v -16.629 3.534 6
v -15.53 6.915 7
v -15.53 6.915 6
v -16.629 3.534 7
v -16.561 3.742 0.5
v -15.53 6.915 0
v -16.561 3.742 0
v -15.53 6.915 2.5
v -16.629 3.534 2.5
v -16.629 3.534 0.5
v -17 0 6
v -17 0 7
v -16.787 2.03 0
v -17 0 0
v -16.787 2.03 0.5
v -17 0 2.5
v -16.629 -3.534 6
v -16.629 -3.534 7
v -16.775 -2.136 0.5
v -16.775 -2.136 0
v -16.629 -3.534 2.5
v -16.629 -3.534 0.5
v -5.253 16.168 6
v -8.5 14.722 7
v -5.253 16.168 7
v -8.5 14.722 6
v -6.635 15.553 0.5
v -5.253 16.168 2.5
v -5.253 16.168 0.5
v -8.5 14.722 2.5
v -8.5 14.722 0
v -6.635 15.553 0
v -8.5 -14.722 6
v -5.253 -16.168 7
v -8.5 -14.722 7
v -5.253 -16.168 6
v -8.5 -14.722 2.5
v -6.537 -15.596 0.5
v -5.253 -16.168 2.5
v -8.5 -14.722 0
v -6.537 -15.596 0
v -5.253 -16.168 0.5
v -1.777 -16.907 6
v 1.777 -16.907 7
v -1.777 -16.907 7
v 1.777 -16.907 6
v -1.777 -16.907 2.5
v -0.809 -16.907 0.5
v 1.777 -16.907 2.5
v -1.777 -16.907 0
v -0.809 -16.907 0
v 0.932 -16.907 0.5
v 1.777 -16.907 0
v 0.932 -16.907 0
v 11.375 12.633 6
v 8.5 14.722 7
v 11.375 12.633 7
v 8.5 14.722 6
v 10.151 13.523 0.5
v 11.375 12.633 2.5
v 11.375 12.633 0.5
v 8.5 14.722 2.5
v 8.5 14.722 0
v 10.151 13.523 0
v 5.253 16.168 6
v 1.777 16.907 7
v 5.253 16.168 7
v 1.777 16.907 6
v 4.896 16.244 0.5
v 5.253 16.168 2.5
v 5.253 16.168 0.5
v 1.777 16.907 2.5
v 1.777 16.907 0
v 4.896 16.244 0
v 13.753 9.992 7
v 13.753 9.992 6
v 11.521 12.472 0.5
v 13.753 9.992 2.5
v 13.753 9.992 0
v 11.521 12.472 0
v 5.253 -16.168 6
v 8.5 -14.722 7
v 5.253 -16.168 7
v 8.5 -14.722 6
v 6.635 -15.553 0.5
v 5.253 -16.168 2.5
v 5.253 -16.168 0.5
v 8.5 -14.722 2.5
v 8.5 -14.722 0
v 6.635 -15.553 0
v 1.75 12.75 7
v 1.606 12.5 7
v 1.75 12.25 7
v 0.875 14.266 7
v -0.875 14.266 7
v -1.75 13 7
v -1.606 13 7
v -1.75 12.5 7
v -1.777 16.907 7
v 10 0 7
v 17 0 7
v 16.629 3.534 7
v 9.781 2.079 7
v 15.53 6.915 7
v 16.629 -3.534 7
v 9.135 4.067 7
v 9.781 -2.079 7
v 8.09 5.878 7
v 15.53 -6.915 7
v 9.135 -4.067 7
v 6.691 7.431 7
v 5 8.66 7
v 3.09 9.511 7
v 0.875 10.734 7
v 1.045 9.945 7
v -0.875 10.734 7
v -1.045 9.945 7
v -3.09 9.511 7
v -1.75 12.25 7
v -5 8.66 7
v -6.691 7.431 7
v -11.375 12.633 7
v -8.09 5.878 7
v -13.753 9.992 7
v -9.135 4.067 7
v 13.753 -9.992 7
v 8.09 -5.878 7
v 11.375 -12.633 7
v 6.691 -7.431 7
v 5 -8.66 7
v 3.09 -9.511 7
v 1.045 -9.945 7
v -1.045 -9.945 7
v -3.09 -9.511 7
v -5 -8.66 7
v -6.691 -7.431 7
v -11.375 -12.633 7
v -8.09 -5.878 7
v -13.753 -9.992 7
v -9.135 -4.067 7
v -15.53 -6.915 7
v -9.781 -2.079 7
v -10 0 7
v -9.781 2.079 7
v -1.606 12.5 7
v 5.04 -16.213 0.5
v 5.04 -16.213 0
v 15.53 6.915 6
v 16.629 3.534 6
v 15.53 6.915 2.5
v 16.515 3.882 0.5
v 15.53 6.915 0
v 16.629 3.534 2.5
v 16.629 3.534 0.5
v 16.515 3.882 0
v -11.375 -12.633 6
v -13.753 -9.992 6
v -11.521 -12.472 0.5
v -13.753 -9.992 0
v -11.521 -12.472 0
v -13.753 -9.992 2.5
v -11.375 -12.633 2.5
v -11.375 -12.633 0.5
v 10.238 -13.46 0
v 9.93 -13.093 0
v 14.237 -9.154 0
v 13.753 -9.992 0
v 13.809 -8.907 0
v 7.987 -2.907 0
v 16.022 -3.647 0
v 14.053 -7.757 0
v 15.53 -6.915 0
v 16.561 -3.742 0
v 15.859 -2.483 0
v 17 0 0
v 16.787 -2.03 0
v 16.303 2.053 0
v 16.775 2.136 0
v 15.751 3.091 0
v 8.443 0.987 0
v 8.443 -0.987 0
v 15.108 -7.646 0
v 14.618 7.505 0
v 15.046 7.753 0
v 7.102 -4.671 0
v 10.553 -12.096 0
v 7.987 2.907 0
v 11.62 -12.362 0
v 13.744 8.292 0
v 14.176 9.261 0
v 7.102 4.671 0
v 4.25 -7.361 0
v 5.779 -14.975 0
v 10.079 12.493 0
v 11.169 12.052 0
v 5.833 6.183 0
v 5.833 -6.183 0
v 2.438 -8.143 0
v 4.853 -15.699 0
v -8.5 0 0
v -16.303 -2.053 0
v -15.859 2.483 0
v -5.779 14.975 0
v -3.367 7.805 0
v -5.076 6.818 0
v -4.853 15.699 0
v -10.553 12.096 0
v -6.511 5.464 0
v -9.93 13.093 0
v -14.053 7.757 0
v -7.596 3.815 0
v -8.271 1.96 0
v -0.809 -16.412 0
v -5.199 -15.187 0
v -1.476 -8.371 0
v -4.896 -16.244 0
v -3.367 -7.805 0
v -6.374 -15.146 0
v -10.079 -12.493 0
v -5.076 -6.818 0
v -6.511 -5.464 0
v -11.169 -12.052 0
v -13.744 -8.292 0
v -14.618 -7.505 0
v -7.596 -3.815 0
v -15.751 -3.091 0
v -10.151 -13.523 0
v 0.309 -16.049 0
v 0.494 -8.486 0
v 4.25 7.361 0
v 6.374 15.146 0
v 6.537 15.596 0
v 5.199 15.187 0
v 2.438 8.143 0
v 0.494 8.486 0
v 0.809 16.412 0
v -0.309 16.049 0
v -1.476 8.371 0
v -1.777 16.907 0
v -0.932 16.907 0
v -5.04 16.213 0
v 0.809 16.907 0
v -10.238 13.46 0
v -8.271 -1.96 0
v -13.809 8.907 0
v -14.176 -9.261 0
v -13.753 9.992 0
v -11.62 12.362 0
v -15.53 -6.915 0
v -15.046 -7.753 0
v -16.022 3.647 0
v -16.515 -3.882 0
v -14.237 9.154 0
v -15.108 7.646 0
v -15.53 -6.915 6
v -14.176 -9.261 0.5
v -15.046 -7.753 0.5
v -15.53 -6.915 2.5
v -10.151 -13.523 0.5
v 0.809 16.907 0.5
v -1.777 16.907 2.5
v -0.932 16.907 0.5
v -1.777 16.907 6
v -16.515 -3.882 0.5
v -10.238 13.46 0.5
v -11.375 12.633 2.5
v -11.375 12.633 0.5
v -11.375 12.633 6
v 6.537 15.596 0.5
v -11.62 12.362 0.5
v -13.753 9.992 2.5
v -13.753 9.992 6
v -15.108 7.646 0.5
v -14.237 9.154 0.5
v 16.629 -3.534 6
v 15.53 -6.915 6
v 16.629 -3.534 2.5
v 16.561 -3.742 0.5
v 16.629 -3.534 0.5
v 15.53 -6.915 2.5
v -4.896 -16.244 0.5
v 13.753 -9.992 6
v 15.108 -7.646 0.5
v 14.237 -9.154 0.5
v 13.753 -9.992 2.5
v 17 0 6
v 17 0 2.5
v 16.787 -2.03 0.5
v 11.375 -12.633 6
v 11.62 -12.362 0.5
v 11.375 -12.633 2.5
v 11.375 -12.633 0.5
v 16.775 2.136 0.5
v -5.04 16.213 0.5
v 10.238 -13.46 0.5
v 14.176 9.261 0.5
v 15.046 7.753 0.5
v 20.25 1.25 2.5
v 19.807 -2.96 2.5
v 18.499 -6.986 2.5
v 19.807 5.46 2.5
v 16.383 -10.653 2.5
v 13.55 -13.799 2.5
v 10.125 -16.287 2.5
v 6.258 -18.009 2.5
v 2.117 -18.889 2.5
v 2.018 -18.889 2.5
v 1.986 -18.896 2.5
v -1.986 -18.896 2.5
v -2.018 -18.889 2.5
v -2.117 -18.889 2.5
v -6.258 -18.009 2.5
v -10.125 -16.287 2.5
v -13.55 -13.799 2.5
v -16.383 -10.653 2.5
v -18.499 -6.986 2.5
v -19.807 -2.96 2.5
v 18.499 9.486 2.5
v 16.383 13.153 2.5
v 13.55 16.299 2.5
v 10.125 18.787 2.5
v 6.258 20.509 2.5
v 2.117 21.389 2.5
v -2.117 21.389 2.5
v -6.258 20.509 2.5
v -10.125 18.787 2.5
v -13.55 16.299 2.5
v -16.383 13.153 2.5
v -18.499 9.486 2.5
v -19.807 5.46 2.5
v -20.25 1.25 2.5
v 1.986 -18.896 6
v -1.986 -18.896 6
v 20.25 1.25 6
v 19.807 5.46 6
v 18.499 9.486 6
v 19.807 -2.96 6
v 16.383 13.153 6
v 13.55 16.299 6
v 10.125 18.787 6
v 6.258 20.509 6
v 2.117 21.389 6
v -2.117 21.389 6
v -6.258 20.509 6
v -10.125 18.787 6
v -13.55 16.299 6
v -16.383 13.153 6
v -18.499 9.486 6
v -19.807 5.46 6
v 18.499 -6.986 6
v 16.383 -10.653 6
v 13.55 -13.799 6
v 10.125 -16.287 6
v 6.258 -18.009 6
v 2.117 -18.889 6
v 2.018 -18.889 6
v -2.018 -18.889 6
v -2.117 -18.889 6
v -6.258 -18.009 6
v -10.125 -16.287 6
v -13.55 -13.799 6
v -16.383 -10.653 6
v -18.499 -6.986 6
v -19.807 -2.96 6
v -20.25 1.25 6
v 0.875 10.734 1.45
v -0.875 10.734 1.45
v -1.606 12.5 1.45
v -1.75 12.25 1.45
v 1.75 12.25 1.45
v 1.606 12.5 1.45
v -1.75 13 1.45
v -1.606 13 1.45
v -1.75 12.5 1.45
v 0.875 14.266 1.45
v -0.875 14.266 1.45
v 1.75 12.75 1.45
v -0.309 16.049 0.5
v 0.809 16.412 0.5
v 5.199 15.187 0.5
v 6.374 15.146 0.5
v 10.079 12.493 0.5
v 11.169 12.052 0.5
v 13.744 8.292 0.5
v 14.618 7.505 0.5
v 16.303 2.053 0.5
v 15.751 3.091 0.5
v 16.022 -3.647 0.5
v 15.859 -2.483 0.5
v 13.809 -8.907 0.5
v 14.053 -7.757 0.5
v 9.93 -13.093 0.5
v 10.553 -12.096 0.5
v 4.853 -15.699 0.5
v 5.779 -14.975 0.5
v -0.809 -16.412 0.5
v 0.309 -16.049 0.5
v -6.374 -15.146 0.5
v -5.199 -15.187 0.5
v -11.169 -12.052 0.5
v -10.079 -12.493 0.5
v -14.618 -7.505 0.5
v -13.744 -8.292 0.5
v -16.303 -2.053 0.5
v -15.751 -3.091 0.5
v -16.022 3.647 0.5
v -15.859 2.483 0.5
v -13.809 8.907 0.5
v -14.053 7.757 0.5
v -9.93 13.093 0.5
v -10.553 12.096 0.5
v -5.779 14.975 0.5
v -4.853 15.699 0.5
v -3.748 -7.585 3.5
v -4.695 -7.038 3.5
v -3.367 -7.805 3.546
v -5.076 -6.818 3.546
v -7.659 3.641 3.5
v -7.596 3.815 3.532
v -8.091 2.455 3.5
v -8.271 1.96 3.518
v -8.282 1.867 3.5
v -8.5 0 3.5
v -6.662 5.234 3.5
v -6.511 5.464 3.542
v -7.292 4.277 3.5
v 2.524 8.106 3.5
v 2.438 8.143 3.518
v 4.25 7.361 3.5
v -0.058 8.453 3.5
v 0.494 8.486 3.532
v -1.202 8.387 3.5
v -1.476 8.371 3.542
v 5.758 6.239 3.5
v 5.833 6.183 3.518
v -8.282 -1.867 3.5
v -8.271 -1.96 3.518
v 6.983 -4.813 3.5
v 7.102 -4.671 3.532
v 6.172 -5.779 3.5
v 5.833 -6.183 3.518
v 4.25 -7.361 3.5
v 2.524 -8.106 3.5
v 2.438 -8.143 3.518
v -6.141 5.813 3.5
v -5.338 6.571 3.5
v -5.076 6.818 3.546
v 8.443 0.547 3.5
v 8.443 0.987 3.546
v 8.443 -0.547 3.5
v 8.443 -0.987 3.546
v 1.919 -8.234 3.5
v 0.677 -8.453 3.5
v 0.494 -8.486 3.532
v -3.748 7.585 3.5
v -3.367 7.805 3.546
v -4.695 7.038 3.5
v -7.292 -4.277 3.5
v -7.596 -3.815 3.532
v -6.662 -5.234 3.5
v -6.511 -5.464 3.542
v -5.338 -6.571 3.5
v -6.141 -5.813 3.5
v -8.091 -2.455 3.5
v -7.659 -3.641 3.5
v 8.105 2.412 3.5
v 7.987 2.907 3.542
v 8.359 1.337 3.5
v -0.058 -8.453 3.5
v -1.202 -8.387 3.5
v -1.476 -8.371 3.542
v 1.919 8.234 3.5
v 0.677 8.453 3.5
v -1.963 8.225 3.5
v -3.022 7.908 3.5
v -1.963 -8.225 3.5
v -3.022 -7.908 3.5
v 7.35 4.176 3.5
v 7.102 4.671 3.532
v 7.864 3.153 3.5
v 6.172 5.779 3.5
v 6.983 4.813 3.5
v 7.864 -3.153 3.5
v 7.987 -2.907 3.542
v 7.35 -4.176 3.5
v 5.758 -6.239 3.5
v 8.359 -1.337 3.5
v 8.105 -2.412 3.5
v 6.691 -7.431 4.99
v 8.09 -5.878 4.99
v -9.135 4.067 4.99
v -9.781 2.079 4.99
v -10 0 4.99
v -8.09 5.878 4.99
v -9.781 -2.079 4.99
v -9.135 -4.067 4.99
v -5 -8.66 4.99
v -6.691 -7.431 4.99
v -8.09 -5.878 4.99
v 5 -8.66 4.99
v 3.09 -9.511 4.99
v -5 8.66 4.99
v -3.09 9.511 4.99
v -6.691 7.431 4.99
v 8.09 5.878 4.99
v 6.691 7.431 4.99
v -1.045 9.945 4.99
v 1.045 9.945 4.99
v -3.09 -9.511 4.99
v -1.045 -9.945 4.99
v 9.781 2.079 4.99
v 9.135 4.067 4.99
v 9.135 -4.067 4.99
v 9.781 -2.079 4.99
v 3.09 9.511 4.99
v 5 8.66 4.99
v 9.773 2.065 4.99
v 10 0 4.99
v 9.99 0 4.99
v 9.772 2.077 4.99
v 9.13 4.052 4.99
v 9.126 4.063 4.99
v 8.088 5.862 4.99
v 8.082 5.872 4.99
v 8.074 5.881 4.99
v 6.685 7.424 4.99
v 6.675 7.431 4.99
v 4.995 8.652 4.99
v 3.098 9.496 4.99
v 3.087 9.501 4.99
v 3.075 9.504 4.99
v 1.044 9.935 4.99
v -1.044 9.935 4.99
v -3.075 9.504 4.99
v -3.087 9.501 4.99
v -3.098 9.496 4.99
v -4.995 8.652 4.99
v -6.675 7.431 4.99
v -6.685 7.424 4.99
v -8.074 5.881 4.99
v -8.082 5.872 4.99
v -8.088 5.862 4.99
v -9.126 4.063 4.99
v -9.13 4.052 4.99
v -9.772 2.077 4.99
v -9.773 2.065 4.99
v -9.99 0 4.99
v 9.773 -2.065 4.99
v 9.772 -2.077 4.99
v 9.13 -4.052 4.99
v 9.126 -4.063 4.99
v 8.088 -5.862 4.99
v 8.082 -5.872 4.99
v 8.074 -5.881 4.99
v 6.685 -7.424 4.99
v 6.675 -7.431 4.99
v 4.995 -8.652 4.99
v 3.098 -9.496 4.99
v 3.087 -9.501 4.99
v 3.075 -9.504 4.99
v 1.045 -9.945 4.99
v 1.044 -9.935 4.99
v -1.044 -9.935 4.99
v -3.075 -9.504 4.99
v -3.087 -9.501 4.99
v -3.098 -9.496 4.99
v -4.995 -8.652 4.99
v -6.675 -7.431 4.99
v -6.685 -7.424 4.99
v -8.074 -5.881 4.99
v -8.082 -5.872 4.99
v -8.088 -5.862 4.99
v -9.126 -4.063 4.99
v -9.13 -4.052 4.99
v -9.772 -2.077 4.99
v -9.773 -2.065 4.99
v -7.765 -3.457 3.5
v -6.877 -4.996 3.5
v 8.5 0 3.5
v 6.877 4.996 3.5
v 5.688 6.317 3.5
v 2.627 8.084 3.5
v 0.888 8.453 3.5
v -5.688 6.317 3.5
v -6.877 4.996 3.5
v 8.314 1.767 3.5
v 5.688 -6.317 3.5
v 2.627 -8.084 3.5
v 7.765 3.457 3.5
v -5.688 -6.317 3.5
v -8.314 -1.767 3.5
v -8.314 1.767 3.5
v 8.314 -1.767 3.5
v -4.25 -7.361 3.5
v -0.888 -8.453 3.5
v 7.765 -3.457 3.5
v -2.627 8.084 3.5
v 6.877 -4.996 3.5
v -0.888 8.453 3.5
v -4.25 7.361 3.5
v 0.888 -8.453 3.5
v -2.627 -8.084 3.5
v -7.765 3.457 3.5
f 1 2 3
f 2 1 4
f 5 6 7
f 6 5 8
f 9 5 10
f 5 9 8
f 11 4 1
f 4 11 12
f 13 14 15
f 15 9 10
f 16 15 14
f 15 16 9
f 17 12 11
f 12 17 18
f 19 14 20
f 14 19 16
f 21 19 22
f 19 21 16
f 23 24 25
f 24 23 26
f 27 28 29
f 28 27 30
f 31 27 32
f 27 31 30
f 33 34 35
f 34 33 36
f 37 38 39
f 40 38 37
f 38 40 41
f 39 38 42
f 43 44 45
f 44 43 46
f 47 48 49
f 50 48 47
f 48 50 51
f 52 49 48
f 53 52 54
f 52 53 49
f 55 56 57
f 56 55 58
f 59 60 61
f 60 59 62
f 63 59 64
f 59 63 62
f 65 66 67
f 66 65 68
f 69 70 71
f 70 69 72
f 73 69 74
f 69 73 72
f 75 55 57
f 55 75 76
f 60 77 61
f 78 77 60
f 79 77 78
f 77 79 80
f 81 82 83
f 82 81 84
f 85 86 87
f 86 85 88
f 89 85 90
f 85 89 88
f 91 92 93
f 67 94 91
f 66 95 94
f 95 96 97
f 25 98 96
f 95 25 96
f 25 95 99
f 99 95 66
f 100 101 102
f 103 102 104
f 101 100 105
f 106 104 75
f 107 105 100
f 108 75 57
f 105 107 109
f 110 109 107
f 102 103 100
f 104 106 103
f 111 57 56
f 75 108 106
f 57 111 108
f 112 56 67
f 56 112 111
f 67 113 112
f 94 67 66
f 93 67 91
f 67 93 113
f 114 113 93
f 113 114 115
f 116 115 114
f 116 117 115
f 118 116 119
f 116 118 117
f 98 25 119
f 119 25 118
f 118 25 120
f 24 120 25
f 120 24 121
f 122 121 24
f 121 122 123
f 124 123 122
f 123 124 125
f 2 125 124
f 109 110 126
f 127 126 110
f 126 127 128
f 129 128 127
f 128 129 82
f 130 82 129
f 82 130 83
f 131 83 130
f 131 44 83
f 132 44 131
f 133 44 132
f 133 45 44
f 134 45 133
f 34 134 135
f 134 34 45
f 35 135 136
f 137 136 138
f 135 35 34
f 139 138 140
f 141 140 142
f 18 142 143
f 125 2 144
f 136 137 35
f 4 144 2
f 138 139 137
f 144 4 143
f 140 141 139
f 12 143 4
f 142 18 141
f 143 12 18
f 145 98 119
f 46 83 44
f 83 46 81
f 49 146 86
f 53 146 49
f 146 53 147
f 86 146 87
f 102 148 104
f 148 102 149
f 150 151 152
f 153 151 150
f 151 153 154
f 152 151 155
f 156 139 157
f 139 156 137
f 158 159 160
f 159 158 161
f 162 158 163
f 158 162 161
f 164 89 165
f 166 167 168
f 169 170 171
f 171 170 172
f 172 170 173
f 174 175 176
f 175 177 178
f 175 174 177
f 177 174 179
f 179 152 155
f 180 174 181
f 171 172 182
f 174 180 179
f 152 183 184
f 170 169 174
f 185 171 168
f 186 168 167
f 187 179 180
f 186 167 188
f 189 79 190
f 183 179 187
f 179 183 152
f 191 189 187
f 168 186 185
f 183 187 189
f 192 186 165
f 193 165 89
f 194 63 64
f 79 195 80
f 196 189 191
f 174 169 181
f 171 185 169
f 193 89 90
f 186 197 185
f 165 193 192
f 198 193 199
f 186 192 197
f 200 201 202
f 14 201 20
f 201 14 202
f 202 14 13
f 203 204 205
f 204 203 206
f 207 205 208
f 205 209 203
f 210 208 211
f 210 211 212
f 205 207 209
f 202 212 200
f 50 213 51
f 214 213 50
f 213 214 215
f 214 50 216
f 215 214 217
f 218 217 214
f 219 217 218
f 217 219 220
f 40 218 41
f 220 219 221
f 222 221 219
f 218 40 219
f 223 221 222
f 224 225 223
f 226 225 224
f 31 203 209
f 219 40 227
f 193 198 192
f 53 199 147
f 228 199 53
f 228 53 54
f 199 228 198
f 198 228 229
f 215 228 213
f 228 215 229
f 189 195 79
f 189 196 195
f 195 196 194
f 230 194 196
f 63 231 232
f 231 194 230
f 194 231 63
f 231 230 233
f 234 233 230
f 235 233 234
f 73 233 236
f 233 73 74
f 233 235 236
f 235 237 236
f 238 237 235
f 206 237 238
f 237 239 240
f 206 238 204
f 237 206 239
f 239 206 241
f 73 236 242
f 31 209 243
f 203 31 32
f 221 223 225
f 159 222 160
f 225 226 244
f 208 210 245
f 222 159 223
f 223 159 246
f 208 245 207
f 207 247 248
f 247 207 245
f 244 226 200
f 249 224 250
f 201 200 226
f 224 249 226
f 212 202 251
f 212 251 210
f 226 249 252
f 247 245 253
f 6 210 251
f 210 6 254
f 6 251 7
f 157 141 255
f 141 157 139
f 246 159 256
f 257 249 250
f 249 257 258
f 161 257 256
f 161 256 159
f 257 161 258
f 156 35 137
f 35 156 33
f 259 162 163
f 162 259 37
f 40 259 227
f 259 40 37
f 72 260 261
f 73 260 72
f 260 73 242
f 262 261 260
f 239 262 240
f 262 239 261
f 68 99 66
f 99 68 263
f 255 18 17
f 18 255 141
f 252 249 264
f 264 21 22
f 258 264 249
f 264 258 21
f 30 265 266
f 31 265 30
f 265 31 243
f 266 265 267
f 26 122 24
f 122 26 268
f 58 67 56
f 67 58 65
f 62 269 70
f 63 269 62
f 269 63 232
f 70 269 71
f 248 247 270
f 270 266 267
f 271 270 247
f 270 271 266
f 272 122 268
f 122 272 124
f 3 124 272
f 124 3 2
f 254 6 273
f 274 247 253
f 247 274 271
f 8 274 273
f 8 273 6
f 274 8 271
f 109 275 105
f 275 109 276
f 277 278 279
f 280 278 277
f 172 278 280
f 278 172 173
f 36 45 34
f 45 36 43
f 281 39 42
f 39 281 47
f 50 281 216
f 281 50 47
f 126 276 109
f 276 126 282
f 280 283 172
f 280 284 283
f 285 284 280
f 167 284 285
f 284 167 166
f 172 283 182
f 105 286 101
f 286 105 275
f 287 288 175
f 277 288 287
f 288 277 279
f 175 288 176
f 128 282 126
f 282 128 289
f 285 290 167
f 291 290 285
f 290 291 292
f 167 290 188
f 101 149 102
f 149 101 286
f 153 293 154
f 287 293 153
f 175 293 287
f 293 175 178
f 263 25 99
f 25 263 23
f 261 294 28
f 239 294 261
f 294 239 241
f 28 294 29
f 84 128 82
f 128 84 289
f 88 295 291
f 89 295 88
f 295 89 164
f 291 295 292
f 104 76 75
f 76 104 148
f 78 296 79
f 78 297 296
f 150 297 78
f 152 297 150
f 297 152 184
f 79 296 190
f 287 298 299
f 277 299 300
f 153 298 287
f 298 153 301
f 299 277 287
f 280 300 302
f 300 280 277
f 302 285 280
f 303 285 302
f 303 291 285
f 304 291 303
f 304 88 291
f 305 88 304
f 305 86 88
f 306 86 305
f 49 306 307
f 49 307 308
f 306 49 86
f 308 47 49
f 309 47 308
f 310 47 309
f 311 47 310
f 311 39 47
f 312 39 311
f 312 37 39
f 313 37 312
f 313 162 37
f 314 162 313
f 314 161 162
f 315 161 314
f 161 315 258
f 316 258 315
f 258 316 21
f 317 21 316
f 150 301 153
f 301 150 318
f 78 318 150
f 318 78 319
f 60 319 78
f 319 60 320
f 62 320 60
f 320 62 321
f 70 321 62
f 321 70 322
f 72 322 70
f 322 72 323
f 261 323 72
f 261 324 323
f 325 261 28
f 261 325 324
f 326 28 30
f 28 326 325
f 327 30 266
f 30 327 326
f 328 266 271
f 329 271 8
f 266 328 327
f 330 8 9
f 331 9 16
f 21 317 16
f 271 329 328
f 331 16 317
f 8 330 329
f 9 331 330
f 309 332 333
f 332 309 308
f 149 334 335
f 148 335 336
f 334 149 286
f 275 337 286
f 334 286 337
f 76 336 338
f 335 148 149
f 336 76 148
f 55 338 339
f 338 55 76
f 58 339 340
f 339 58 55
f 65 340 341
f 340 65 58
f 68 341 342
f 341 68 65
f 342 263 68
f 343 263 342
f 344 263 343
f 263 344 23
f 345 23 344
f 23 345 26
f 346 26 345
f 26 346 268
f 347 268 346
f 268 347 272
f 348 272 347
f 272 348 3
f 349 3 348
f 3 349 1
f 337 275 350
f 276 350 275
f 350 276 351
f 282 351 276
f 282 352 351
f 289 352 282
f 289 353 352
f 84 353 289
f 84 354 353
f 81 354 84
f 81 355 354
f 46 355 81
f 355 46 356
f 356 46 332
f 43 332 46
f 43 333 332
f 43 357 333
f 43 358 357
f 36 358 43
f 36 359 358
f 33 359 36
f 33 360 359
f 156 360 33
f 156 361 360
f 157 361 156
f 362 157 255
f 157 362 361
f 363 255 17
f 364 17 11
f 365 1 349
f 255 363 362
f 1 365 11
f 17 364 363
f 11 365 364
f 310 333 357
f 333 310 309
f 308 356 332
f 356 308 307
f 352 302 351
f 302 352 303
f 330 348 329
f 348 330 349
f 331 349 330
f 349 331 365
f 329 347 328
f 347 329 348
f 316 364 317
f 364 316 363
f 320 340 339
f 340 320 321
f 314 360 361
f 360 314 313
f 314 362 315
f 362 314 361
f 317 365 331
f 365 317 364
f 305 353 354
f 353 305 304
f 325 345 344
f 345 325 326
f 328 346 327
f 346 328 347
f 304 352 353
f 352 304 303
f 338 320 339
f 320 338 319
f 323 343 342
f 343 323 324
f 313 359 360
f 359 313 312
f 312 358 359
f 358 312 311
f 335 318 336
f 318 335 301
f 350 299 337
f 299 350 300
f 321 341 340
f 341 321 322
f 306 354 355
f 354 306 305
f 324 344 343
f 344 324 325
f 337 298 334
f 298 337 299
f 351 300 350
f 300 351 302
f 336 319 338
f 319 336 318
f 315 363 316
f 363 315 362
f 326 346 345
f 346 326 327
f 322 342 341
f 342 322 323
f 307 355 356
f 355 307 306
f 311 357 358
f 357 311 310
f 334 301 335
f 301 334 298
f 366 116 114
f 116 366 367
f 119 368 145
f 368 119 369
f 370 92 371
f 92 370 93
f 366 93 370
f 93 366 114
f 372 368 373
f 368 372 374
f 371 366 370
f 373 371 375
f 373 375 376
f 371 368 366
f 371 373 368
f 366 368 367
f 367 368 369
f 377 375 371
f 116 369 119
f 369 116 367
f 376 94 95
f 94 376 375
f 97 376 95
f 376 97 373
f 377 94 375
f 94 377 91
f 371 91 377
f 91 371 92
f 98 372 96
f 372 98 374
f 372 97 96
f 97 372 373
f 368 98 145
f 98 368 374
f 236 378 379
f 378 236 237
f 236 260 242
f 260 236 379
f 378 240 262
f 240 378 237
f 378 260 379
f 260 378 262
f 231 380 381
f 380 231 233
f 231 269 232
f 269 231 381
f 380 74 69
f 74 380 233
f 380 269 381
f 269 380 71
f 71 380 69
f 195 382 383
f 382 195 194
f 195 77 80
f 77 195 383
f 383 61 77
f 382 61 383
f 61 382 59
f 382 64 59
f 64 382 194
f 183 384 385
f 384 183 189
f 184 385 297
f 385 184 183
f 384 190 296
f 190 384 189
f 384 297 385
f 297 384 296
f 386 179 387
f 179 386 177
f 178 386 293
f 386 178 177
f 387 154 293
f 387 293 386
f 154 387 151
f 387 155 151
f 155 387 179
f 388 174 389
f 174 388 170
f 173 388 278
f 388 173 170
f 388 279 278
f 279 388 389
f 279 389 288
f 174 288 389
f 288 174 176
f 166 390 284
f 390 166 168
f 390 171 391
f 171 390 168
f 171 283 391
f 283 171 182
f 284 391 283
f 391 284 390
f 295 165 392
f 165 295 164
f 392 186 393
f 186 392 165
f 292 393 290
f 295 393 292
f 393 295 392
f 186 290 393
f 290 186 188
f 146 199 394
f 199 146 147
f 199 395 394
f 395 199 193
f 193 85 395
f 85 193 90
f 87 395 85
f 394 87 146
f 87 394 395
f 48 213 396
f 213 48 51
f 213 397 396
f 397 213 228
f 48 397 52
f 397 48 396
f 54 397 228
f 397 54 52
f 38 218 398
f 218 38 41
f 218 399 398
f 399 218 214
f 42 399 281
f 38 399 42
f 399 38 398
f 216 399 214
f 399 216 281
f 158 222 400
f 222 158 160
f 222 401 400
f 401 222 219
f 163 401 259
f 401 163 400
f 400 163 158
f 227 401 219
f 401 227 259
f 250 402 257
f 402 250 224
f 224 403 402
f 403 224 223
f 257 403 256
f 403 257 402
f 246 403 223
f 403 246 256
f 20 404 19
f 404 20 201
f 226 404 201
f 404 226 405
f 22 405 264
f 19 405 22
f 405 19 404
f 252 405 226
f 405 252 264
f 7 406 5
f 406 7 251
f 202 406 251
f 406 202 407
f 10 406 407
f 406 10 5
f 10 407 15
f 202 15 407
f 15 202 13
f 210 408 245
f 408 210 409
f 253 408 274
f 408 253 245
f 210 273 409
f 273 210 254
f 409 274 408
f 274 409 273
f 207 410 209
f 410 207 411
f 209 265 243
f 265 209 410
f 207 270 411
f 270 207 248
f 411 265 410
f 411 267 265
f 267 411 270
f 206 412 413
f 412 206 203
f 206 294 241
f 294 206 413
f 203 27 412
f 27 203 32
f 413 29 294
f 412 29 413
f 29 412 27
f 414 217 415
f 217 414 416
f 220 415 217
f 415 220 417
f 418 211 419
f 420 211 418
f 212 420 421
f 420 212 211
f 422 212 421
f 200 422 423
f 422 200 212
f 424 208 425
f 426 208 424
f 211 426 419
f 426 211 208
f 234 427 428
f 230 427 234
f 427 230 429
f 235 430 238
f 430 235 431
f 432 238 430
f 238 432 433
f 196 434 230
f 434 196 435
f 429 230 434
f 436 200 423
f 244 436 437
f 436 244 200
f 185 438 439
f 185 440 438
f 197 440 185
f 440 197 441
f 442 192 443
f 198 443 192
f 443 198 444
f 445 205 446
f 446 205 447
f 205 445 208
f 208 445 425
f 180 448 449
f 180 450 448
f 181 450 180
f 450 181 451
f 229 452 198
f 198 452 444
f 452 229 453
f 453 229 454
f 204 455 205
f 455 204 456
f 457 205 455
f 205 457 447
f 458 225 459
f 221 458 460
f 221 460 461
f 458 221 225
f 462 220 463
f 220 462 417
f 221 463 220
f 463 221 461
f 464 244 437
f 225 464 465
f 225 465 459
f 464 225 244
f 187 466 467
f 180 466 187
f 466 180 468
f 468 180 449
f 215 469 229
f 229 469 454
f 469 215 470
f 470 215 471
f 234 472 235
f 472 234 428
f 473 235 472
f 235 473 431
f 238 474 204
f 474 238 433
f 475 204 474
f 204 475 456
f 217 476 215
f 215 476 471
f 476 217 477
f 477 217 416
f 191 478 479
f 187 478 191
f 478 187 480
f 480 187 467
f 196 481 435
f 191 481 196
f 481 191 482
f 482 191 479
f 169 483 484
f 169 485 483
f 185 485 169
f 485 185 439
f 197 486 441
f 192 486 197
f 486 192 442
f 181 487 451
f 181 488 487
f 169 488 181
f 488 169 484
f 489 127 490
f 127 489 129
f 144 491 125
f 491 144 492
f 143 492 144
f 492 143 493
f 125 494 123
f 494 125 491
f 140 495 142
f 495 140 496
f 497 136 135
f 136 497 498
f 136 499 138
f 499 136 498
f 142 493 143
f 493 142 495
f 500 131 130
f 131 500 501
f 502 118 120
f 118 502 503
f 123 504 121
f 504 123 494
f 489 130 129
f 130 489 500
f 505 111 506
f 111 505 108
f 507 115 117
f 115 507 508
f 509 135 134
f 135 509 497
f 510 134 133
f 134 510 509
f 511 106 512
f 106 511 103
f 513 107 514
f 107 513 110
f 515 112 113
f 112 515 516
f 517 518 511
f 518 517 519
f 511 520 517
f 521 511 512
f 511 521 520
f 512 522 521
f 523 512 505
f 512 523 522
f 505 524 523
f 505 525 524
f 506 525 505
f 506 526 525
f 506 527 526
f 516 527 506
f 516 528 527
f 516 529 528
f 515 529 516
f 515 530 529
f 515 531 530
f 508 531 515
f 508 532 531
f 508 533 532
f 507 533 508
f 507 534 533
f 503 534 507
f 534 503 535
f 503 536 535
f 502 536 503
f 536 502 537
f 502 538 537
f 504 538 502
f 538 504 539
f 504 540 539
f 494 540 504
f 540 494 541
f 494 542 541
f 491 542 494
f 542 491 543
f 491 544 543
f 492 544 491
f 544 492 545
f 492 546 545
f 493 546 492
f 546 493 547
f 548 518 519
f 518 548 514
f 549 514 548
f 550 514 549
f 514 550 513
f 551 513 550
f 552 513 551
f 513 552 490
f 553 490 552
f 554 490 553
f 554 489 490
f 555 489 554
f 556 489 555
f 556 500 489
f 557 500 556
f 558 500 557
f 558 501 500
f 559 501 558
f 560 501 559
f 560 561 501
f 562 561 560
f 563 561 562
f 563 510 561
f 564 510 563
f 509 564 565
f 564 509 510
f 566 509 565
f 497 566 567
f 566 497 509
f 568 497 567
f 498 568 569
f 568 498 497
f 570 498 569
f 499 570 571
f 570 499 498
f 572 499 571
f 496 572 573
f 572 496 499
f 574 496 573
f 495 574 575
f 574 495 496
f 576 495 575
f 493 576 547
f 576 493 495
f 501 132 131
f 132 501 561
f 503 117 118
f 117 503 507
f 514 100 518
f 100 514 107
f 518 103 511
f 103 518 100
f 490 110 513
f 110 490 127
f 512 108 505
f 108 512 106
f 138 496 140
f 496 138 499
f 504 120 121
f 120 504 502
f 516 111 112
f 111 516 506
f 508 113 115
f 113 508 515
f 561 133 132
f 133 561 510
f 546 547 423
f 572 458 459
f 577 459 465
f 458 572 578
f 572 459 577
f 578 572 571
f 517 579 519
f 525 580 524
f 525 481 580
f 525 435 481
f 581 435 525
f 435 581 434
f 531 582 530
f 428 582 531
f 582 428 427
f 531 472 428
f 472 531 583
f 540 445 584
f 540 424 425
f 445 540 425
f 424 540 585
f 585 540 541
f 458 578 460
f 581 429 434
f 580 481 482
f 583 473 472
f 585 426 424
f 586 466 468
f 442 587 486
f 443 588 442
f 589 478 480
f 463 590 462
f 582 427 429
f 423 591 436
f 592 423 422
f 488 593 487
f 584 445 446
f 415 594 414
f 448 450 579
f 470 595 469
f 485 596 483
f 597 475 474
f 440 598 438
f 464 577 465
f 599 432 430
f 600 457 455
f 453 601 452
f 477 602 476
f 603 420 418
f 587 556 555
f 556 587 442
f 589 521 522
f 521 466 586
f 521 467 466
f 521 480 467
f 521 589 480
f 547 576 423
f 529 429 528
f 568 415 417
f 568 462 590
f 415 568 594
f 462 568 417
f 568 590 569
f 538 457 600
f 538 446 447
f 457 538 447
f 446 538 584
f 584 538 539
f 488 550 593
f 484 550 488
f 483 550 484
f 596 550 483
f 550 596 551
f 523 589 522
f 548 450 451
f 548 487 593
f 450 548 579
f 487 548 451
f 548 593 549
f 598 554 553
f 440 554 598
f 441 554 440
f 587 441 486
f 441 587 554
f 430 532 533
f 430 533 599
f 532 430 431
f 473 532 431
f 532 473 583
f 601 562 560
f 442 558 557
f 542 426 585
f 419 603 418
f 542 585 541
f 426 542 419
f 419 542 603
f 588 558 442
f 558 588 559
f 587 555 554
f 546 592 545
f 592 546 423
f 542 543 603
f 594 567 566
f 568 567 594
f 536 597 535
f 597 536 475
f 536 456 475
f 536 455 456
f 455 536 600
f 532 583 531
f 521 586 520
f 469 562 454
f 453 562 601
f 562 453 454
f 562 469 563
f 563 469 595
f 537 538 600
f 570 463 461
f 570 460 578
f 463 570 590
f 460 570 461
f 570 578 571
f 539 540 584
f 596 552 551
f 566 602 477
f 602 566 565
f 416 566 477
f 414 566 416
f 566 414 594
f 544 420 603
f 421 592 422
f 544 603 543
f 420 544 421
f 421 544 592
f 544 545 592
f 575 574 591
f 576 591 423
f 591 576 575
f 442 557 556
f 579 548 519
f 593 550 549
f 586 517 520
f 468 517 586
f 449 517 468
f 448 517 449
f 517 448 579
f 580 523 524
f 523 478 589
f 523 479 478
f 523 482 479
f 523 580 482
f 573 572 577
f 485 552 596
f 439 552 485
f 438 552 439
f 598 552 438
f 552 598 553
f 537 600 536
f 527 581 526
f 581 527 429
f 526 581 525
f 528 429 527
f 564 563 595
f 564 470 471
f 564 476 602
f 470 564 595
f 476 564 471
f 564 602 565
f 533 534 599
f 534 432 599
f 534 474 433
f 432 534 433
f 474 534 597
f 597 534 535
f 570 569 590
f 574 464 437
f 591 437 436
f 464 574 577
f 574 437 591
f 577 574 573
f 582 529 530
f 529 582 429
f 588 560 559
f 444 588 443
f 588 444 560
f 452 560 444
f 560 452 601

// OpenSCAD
// Rotate the disc by 180 degrees to flip it upside down, which
// makes it easier to print the hole, etc. Lift it up by 7mm to bring
// it back above the axis // (the entire body is 7mm high).
translate([0, 0, 7]) rotate(a=[0,180,0]) difference() {
	union() {
		// Big cylinder for placement inside the machine.
		cylinder(h = 7, r = 17);

		// Outer cylinder; any sewing information would go here.
		//translate([0, 0, 1]) cylinder(h = 3.5, r = 21.5);//maximum
		translate([0, 0, 1]) cylinder(h = 3.5, r = 19);//minimum
		translate([0, 1.25, 1]) cylinder(h = 3.5, r = 20.25);//Durchschnitt
	}

	// Subtract the inner hole. Be very generous.
	translate([0, 0, 4])
		cylinder(h = 10, r = 8.5, center=true);

	// Subtract the lower cone.
	cylinder(h = 2.01, r = 10);

	// Subtract the diagonal layer the disk rests on.
	translate([0, 0, 2])
		cylinder(h = 1.5, r1 = 10, r2 = 8.5);

	// Transport hole
	union() {
		translate([0, 12.25, -0.05])
			cylinder(h = 5.6, r=1.75);
		translate([0, 12.75, -0.05])
			cylinder(h = 5.6, r=1.75);
		translate([0, 12.5, -0.05])
			cube(size = [1.75, 0.5, 5.6]);
	}

	// Mark the 18 stitches.
	// This is where the needle is at its deepest point.
	// Only for modelling, remove before print!
	for (z=[0 : 17]) // 18 times
	{
		rotate(a=[0, 0, z*20]) { 
   		translate([0, 17, 7])
				cylinder(h= 1, r=1, center=true);
		}
	}
}
